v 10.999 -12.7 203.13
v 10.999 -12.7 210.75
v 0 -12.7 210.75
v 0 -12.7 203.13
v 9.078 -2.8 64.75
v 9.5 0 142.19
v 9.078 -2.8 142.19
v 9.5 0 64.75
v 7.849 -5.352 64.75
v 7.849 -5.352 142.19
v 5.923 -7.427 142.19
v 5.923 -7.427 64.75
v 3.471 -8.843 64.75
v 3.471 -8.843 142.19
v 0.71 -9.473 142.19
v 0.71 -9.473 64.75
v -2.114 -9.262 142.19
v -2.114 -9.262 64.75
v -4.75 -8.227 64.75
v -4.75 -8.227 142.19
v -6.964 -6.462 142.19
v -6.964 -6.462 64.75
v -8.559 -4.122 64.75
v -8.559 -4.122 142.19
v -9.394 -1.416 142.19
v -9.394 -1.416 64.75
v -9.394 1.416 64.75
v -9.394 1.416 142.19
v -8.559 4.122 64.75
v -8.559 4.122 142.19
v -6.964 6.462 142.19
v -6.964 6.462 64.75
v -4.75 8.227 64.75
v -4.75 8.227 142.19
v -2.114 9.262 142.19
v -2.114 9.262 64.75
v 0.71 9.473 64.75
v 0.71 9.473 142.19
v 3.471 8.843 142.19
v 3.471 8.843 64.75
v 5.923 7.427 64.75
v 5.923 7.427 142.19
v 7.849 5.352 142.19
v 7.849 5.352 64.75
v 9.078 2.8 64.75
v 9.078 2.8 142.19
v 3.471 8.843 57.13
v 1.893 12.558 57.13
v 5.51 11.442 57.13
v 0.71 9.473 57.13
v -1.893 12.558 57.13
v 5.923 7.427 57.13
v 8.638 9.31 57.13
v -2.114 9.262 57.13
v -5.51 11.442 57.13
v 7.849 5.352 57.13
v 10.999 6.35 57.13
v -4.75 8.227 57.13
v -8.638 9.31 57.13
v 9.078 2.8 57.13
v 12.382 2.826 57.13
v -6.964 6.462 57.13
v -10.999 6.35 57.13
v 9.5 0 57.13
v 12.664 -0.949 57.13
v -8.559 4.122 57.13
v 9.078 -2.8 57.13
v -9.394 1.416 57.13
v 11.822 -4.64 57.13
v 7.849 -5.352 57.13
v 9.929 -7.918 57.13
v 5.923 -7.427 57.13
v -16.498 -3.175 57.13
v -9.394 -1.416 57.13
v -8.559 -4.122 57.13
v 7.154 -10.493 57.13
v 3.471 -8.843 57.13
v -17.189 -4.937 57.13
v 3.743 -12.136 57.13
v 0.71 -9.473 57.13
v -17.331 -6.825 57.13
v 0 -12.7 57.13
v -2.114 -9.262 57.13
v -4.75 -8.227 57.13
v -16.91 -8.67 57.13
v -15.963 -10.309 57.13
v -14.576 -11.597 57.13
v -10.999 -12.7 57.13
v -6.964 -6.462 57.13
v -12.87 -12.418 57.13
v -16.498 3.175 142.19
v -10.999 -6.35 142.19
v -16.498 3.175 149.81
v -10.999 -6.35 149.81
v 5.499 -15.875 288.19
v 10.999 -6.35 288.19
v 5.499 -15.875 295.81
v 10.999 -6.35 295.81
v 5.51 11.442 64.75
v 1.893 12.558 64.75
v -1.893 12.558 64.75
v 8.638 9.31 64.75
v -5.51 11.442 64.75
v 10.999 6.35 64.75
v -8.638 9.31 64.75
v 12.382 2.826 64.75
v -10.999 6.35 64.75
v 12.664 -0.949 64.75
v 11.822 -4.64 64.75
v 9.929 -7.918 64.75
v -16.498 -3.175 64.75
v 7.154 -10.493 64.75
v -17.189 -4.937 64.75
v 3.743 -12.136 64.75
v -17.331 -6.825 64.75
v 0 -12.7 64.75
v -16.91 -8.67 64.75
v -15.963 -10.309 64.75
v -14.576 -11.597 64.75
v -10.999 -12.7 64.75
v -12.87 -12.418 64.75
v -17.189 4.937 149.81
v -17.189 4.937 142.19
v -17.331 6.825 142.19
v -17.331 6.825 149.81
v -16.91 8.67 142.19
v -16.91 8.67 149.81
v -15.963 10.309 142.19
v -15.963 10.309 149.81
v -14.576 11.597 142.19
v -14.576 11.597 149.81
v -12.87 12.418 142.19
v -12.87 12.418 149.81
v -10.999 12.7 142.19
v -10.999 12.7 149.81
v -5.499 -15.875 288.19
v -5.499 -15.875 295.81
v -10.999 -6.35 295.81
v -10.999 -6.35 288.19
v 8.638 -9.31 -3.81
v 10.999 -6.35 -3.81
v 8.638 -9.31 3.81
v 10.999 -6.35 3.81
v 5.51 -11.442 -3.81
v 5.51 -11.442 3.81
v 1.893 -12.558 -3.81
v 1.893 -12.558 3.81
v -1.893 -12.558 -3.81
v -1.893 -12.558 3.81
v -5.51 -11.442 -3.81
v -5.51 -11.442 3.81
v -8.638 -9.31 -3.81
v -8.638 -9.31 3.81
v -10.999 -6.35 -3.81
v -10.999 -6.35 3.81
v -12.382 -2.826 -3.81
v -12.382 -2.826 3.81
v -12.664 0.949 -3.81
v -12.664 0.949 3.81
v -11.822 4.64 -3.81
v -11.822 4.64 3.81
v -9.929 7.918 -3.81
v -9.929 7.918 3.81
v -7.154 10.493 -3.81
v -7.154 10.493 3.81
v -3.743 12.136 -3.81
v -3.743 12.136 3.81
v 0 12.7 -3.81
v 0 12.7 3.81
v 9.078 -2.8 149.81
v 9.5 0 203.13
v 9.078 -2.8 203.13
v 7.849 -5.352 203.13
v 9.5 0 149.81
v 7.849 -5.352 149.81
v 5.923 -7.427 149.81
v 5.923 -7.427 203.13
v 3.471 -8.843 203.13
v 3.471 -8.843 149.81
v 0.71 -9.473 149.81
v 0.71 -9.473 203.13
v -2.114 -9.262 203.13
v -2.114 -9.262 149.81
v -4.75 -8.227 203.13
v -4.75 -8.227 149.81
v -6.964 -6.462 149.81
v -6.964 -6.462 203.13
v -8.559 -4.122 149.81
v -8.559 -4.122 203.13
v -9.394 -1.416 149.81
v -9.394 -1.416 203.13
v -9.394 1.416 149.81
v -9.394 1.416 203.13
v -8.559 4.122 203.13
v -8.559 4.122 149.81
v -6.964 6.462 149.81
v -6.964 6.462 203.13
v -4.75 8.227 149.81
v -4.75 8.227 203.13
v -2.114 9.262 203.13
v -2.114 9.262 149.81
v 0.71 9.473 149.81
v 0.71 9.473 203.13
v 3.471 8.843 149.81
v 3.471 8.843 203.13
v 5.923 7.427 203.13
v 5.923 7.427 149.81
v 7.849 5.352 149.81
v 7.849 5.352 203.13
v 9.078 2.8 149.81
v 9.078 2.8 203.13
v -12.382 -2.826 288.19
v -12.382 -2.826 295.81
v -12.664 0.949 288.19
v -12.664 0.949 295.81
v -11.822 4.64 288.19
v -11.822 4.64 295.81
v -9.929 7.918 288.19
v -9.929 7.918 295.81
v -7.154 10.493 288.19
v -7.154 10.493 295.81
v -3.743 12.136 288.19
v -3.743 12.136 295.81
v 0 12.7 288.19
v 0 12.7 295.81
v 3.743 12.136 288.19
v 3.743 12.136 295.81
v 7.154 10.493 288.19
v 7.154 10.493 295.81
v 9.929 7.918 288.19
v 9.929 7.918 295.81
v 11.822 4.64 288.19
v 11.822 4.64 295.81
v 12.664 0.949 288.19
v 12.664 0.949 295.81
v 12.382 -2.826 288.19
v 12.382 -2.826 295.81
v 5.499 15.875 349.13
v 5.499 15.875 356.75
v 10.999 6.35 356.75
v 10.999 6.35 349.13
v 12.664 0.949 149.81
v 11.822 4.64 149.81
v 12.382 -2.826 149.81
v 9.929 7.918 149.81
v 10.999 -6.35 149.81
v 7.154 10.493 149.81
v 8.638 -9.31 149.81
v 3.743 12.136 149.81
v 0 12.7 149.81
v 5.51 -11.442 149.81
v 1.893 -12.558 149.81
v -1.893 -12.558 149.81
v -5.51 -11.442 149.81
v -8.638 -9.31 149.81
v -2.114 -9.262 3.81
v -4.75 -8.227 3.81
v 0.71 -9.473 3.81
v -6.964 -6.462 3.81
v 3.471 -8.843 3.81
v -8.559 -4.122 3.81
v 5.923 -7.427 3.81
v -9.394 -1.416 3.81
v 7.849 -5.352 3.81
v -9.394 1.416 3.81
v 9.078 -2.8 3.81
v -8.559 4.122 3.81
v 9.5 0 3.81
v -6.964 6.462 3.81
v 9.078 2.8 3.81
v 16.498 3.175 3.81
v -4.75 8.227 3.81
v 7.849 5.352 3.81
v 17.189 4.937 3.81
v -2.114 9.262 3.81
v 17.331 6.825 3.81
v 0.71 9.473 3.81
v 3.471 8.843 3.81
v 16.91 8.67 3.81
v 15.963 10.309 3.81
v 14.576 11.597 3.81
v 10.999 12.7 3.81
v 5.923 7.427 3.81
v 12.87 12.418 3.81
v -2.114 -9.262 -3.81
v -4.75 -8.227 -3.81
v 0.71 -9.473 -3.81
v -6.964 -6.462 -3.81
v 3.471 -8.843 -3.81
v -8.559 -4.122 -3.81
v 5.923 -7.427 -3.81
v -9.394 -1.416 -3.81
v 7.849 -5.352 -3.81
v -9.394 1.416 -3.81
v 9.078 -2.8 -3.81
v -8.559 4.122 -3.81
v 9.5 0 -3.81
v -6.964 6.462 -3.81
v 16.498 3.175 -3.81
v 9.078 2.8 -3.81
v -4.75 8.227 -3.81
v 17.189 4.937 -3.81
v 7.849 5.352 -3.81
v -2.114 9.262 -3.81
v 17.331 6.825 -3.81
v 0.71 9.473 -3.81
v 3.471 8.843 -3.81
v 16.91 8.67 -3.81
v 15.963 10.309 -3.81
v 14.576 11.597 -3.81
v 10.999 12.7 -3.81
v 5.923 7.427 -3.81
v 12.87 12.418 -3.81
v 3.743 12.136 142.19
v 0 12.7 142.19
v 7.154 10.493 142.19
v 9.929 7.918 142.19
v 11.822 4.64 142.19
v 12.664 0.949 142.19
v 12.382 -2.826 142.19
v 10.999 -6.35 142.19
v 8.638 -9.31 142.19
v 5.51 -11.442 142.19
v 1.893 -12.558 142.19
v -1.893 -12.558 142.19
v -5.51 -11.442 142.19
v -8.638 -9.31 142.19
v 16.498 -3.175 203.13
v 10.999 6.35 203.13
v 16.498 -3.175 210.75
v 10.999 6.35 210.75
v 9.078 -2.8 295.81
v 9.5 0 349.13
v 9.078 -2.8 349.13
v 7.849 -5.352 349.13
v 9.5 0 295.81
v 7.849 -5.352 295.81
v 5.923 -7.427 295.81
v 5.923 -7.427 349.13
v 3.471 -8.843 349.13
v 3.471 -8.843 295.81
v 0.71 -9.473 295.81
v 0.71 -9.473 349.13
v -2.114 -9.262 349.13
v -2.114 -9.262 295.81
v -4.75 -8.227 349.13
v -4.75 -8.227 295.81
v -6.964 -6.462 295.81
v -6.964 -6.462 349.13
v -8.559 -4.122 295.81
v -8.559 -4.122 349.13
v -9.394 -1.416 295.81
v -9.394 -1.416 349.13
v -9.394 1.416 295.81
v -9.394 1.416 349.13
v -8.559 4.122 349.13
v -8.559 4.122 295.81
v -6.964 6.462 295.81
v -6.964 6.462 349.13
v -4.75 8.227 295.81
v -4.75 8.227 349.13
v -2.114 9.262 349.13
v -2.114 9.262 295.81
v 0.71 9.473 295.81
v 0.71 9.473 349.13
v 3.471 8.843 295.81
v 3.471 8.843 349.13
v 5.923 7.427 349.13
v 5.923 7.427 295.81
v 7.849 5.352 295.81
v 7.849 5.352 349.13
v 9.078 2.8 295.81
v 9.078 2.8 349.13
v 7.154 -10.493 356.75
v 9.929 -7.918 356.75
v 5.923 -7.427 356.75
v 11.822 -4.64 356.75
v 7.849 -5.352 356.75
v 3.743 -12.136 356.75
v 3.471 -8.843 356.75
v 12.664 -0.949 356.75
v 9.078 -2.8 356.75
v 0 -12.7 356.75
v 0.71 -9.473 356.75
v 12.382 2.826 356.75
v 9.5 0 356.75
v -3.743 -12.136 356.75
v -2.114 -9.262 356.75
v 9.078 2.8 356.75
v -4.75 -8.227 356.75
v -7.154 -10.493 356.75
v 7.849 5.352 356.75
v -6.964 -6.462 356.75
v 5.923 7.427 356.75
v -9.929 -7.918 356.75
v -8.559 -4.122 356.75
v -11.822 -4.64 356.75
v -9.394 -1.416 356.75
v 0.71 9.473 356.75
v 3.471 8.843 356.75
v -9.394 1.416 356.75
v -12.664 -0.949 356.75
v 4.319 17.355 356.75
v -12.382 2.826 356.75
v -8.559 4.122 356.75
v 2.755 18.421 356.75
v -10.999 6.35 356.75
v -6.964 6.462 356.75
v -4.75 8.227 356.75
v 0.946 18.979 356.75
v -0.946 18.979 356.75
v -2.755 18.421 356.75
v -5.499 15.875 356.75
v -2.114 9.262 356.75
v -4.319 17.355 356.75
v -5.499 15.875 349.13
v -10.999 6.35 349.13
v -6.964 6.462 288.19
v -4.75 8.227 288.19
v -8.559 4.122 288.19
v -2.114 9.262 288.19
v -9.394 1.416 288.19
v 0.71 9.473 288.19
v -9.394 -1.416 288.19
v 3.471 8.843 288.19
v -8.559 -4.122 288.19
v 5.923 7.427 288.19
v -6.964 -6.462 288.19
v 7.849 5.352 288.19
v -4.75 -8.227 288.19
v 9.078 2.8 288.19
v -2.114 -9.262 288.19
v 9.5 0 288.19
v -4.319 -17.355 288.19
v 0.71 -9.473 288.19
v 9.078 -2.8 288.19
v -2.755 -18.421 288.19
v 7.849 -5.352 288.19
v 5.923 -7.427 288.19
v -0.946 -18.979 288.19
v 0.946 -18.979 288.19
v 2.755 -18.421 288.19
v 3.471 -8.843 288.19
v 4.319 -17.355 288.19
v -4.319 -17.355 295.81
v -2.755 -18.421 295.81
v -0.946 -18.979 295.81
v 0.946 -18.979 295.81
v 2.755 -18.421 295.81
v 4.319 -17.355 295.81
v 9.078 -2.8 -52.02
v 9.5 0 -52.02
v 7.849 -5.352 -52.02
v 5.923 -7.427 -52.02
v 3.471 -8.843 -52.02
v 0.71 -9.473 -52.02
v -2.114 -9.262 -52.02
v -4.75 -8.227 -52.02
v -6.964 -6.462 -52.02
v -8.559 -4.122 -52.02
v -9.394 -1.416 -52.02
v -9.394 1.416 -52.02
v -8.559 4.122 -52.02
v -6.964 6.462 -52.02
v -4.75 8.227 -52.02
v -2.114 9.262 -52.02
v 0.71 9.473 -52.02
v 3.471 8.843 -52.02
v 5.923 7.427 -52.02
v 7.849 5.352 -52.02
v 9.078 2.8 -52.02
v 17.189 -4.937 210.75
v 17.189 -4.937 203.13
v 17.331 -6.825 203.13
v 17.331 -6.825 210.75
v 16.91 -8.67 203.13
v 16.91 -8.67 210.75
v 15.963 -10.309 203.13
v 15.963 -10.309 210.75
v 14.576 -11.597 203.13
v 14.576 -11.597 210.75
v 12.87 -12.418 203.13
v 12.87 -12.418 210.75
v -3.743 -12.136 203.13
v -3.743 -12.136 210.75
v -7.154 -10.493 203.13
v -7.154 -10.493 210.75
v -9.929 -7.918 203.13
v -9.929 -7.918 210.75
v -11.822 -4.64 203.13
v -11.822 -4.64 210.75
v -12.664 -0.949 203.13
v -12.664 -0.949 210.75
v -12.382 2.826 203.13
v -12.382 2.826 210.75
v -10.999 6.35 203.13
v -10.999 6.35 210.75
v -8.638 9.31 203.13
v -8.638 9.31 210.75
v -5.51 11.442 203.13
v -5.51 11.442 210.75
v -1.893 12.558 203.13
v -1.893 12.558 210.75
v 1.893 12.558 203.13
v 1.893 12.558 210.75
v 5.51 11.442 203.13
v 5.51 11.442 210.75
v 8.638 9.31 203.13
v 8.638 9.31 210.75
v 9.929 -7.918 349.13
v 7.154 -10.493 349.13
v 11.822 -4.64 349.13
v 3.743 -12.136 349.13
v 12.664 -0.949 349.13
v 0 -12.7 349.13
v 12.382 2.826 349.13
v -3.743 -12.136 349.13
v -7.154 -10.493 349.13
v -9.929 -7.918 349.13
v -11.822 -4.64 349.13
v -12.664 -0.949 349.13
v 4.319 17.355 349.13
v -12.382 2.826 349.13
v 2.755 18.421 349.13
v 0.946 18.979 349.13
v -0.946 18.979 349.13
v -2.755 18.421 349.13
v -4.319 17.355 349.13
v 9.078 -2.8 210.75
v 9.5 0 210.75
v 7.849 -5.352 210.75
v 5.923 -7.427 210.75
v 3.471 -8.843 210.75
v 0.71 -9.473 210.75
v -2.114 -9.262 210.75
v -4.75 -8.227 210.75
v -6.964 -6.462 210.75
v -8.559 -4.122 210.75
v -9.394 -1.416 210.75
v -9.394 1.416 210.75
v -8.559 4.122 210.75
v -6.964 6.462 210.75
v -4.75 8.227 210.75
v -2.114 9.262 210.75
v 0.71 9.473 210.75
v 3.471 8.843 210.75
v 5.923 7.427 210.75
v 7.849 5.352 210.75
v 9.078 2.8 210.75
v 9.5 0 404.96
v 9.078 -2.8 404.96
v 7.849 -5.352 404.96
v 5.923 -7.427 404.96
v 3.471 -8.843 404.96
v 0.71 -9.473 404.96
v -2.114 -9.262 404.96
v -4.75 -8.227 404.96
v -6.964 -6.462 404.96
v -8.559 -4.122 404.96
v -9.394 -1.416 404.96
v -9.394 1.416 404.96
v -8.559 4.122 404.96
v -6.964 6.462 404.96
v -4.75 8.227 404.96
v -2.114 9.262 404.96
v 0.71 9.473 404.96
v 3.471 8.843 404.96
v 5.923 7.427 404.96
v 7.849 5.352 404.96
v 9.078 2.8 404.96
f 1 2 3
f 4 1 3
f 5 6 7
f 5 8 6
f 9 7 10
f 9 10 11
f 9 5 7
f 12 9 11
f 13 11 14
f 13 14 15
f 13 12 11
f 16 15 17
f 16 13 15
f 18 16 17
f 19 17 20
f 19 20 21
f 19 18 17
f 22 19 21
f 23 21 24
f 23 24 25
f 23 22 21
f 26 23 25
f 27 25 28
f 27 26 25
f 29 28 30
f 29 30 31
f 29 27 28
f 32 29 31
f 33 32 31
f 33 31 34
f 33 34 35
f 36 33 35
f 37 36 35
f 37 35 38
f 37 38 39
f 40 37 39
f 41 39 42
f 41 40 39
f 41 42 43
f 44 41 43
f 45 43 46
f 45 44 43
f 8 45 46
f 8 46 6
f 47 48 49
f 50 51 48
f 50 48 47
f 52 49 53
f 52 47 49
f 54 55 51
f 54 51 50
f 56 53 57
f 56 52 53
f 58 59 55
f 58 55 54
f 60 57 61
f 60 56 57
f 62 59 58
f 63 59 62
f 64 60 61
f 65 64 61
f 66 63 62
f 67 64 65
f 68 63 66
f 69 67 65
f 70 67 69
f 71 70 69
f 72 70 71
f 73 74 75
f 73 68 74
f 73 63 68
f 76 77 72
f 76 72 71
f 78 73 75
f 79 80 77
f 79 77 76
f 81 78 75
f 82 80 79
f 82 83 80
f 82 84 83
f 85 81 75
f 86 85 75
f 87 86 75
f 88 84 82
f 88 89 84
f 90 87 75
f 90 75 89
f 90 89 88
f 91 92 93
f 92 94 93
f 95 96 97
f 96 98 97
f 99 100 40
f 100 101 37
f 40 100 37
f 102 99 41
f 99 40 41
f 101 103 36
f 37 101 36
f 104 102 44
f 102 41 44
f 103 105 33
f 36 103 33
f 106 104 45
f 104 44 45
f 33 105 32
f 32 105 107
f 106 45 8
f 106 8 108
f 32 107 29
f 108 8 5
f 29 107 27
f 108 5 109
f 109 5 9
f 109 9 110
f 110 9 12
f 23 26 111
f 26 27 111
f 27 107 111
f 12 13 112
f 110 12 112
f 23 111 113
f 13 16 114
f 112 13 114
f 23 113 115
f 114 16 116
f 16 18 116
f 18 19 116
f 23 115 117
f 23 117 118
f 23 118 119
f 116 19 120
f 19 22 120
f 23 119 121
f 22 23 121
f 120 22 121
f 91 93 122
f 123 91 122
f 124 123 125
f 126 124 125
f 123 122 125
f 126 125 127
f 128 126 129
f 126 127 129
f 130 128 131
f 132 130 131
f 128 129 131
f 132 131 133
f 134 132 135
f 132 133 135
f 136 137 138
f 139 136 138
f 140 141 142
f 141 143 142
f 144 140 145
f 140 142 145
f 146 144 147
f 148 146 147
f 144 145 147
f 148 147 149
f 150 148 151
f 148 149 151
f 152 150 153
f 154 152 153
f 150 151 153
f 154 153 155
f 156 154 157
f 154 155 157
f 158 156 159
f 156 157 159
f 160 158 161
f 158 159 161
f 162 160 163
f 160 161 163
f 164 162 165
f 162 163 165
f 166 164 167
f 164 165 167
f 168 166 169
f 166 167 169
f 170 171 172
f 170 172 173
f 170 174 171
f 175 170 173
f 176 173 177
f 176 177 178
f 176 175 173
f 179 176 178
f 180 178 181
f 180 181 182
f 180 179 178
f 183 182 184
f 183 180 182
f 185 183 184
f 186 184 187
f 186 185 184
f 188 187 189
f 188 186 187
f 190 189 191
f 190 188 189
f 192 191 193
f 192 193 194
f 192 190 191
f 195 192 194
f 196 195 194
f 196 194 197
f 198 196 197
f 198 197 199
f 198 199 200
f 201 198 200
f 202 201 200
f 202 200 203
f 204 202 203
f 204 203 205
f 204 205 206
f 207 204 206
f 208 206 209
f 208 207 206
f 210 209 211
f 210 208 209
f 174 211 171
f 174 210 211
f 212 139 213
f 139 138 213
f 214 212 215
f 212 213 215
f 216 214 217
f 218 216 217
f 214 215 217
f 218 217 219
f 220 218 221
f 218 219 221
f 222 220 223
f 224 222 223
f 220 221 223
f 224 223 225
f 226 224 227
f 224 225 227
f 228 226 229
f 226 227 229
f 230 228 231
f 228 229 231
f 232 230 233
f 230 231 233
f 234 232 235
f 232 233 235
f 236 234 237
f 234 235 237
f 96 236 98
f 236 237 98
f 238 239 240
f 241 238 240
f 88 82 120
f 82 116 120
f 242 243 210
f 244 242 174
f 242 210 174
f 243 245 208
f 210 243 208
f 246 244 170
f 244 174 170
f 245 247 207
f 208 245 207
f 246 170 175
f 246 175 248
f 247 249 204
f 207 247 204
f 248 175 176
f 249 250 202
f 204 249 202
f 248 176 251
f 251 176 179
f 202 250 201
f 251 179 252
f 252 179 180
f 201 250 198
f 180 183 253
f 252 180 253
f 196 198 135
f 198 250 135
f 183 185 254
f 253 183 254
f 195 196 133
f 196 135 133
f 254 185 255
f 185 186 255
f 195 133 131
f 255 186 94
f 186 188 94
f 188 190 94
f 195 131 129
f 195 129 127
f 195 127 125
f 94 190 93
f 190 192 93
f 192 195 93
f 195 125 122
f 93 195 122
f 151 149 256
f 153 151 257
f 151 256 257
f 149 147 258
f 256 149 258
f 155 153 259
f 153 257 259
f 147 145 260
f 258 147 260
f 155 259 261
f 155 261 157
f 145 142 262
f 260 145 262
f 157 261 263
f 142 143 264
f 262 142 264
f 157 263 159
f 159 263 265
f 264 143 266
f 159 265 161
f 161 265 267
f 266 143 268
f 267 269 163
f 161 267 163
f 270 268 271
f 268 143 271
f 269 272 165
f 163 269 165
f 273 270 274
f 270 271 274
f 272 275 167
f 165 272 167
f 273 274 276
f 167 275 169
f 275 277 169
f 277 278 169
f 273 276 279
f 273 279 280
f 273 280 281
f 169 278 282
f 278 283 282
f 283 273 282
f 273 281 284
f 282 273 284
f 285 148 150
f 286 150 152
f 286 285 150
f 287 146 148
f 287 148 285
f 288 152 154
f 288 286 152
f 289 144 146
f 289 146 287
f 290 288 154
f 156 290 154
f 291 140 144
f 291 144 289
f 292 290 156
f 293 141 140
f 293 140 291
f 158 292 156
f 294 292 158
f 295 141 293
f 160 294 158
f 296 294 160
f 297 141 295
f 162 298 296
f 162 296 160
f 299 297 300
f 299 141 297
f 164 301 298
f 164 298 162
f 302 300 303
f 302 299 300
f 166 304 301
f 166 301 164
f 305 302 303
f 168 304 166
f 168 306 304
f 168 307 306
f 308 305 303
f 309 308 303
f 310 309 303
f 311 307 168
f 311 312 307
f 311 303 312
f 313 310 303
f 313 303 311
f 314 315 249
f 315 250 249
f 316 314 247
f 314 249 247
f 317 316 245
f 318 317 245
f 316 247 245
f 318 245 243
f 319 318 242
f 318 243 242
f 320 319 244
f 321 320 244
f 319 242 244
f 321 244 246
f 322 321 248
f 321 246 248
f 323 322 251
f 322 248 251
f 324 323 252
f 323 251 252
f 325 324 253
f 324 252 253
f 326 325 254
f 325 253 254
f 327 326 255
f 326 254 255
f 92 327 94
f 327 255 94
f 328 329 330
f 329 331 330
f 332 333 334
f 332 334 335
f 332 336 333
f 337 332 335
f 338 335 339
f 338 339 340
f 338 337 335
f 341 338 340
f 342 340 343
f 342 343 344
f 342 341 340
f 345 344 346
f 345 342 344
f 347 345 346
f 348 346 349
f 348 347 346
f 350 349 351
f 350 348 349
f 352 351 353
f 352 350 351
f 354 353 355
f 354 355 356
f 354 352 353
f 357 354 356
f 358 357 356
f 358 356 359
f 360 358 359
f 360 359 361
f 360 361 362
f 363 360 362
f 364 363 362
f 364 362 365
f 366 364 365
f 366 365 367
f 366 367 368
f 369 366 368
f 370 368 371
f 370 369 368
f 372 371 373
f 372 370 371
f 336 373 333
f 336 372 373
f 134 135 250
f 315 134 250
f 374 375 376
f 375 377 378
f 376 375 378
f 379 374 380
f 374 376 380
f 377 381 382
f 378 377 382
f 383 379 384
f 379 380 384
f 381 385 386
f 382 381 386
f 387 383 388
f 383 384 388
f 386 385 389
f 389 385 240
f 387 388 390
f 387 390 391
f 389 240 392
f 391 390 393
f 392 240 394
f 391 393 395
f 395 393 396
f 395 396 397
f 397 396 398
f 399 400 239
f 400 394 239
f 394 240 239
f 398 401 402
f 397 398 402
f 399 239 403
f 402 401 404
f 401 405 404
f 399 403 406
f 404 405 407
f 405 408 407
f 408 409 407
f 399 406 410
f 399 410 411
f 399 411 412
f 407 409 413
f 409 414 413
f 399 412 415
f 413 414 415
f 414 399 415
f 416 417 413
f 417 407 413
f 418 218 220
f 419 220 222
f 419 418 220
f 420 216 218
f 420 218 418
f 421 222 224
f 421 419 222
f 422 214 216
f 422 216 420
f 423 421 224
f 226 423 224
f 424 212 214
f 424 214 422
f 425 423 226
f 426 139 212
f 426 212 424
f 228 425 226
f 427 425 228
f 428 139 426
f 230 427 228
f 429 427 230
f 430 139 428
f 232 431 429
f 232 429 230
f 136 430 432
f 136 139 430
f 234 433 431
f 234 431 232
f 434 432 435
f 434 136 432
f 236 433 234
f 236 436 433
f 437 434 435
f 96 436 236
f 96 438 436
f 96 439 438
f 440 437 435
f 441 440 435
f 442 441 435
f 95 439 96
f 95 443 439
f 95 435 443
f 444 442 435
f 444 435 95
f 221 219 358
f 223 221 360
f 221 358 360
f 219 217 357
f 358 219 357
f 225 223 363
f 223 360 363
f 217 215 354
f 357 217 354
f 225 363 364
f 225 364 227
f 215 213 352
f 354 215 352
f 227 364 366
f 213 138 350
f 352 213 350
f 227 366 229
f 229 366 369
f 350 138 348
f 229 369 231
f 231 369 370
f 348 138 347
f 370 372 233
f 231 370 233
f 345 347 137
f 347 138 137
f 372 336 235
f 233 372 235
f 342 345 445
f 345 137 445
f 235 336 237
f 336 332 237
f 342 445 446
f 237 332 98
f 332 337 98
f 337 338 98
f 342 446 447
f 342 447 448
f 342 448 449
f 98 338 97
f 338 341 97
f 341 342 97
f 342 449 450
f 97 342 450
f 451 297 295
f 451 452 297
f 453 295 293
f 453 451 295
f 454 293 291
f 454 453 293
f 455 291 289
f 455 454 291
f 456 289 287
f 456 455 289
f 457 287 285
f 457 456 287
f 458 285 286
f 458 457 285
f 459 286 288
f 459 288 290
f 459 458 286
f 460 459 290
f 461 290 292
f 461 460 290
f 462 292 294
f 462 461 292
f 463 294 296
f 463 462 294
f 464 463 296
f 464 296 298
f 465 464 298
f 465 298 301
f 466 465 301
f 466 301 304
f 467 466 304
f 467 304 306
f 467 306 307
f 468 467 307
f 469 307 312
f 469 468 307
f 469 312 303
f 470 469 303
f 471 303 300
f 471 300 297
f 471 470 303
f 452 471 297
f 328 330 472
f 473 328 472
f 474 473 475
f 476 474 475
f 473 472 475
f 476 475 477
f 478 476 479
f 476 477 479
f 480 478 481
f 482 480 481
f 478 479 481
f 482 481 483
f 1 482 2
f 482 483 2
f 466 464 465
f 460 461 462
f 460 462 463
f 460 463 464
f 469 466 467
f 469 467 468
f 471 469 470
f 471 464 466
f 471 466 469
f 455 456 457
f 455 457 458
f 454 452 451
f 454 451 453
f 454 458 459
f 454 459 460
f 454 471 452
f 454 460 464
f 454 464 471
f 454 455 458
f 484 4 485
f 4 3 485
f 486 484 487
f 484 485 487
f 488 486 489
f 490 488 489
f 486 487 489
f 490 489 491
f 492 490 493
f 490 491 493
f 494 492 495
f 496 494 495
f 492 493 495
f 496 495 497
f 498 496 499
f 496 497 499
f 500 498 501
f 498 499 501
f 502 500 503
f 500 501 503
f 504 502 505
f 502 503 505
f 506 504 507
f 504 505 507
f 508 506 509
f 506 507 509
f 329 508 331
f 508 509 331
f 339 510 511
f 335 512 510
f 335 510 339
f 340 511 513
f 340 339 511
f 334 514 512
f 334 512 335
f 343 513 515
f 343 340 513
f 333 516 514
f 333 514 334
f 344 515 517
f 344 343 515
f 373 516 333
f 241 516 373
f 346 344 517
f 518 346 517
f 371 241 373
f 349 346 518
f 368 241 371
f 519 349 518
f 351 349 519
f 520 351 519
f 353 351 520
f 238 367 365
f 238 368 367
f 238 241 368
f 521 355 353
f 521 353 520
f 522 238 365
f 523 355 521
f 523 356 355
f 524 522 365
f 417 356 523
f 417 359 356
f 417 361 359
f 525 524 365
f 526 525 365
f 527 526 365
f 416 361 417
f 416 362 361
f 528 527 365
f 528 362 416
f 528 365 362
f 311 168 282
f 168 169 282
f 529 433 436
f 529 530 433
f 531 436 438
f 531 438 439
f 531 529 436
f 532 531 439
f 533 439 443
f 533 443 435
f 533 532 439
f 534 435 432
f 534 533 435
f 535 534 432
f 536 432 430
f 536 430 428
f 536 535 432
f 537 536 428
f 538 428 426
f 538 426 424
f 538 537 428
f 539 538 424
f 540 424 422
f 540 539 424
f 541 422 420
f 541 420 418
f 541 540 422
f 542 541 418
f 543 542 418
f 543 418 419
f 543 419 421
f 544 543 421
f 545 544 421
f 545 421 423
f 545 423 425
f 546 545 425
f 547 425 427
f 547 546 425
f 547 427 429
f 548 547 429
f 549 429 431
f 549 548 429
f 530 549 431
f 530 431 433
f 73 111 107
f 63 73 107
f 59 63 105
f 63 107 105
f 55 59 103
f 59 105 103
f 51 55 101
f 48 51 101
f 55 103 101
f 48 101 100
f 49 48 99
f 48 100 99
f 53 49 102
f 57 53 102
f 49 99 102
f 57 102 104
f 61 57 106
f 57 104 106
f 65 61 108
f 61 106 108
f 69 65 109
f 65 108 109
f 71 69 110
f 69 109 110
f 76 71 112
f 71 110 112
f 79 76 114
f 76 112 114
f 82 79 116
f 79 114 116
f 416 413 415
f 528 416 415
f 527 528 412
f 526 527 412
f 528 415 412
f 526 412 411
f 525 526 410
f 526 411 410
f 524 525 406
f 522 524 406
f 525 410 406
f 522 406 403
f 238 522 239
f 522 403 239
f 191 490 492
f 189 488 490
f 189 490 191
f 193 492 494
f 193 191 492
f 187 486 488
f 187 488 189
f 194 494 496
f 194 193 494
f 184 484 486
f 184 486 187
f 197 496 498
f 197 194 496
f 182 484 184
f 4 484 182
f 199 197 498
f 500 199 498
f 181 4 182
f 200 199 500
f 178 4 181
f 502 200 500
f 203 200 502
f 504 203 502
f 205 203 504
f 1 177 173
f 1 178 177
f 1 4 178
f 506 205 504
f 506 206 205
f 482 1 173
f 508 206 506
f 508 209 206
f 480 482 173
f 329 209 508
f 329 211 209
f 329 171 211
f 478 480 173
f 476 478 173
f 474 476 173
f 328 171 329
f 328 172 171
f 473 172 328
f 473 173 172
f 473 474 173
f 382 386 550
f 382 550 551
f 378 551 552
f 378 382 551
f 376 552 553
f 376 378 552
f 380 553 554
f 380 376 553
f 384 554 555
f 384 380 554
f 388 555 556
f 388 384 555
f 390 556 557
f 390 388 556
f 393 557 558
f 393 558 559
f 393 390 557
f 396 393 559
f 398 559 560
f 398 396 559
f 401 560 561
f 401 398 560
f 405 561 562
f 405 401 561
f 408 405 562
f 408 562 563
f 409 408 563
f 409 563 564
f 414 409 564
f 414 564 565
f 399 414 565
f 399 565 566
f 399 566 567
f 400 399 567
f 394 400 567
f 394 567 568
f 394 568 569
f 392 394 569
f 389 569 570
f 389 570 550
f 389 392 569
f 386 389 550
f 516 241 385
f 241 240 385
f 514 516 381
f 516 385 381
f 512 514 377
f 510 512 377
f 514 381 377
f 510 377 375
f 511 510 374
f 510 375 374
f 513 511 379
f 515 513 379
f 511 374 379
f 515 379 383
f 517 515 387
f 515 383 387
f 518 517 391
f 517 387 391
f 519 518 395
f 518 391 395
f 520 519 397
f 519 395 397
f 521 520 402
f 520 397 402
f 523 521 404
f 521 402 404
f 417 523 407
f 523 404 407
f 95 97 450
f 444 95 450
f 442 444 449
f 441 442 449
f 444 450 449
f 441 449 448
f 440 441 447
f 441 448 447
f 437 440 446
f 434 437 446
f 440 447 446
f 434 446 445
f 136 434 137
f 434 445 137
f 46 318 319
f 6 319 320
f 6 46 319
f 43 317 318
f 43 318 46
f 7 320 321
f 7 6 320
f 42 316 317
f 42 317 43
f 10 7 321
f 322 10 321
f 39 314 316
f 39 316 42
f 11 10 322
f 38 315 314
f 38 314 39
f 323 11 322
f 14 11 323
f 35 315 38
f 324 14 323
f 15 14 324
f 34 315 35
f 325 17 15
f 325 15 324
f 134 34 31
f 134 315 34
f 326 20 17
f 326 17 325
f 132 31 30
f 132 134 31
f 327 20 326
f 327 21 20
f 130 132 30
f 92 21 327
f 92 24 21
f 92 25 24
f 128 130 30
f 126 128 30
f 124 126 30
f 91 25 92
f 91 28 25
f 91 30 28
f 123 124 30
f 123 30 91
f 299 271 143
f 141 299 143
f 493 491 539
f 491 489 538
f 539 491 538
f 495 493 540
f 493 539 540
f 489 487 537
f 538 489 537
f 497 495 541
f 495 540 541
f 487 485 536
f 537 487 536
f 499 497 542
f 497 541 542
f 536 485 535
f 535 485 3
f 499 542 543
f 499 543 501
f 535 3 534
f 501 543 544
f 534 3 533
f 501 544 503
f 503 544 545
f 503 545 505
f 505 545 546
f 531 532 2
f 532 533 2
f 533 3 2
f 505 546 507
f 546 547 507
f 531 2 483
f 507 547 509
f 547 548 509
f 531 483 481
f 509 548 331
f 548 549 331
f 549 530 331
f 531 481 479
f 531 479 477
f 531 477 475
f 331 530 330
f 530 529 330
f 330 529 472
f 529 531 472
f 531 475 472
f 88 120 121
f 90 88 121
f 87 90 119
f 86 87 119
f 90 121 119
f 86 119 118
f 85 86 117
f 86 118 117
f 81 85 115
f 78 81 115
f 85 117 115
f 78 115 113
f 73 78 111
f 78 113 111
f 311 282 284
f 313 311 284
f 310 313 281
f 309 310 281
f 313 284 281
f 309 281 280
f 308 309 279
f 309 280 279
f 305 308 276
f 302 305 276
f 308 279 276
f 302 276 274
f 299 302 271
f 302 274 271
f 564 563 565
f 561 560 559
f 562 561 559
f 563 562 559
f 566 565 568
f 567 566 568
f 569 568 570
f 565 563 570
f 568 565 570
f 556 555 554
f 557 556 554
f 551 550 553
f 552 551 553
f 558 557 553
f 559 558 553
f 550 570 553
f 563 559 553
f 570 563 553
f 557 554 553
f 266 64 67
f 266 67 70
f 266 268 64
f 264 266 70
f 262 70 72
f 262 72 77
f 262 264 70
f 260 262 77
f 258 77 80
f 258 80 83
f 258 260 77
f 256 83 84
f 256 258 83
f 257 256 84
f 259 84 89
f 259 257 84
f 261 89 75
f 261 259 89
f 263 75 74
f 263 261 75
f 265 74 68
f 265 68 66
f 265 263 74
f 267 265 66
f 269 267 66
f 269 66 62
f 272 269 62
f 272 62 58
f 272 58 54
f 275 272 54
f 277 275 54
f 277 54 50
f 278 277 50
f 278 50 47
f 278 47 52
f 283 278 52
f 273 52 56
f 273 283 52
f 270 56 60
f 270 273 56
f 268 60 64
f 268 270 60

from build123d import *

# Parameters (mm, degrees)
BOSS_EXTRUDE1_DEPTH   = 3.81
LPATTERN1_COUNT       = 2
LPATTERN1_PITCH       = 60.94
LPATTERN2_COUNT       = 2
LPATTERN2_PITCH       = 85.06
LPATTERN3_COUNT       = 2
LPATTERN3_PITCH       = 60.94
LPATTERN5_COUNT       = 2
LPATTERN5_PITCH       = 85.06
LPATTERN6_COUNT       = 2
LPATTERN6_PITCH       = 60.94
BODY_MOVE_COPY1_ANGLE = 180
BODY_MOVE_COPY2_ANGLE = 120
BODY_MOVE_COPY3_ANGLE = 120
SKETCH2_R             = 9.5
BOSS_EXTRUDE2_DEPTH   = 228.49


with BuildPart() as part:
    # Sketch1 → Boss-Extrude1 (new, symmetric)
    with BuildSketch(Plane.XY):
        with BuildLine():
            Line((5.499261314, 15.875), (10.998522628, 6.35))
            ThreePointArc((10.998522628, 6.35), (0, -12.7), (-10.998522628, 6.35))
            Line((-10.998522628, 6.35), (-5.499261314, 15.875))
            ThreePointArc((-5.499261314, 15.875), (0, 19.05), (5.499261314, 15.875))
        make_face()
    extrude(amount=BOSS_EXTRUDE1_DEPTH, both=True)


with BuildPart() as lpattern1_1:
    # LPattern1: pattern copy
    add(part.part.moved(Location(Vector(0, 0, 1) * (1 * LPATTERN1_PITCH))))


with BuildPart() as lpattern2_1:
    # LPattern2: pattern copy
    add(lpattern1_1.part.moved(Location(Vector(0, 0, 1) * (1 * LPATTERN2_PITCH))))


with BuildPart() as lpattern3_1:
    # LPattern3: pattern copy
    add(lpattern2_1.part.moved(Location(Vector(0, 0, 1) * (1 * LPATTERN3_PITCH))))


with BuildPart() as lpattern5_1:
    # LPattern5: pattern copy
    add(lpattern3_1.part.moved(Location(Vector(0, 0, 1) * (1 * LPATTERN5_PITCH))))


with BuildPart() as lpattern6_1:
    # LPattern6: pattern copy
    add(lpattern5_1.part.moved(Location(Vector(0, 0, 1) * (1 * LPATTERN6_PITCH))))


with BuildPart() as lpattern5_1_1:
    # Body-Move/Copy1: moved
    add(lpattern5_1.part.rotate(Axis((0, 0, 0), (0, 0, 1)), BODY_MOVE_COPY1_ANGLE))


with BuildPart() as lpattern2_1_1:
    # Body-Move/Copy1: moved
    add(lpattern2_1.part.rotate(Axis((0, 0, 0), (0, 0, 1)), BODY_MOVE_COPY1_ANGLE))


with BuildPart() as part_1:
    # Body-Move/Copy1: moved
    add(part.part.rotate(Axis((0, 0, 0), (0, 0, 1)), BODY_MOVE_COPY1_ANGLE))


with BuildPart() as lpattern3_1_1:
    # Body-Move/Copy2: moved
    add(lpattern3_1.part.rotate(Axis((0, 0, 0), (0, 0, -1)), BODY_MOVE_COPY2_ANGLE))


with BuildPart() as lpattern2_1_2:
    # Body-Move/Copy2: moved
    add(lpattern2_1_1.part.rotate(Axis((0, 0, 0), (0, 0, -1)), BODY_MOVE_COPY2_ANGLE))


with BuildPart() as lpattern1_1_1:
    # Body-Move/Copy3: moved
    add(lpattern1_1.part.rotate(Axis((0, 0, 0), (0, 0, 1)), BODY_MOVE_COPY3_ANGLE))


with BuildPart() as part_2:
    # Body-Move/Copy3: moved
    add(part_1.part.rotate(Axis((0, 0, 0), (0, 0, 1)), BODY_MOVE_COPY3_ANGLE))


    add(lpattern1_1_1.part)  # Boss-Extrude2 merges LPattern1_1

    add(lpattern2_1_2.part)  # Boss-Extrude2 merges LPattern2_1

    add(lpattern3_1_1.part)  # Boss-Extrude2 merges LPattern3_1

    add(lpattern5_1_1.part)  # Boss-Extrude2 merges LPattern5_1

    add(lpattern6_1.part)  # Boss-Extrude2 merges LPattern6_1
    # Sketch2 → Boss-Extrude2 (add, symmetric)
    with BuildSketch(Plane(origin=(0, 0, 176.47), x_dir=(-1, 0, 0), z_dir=(0, 0, -1))):
        Circle(SKETCH2_R)
    extrude(amount=BOSS_EXTRUDE2_DEPTH, both=True)


solid = part_2.part
